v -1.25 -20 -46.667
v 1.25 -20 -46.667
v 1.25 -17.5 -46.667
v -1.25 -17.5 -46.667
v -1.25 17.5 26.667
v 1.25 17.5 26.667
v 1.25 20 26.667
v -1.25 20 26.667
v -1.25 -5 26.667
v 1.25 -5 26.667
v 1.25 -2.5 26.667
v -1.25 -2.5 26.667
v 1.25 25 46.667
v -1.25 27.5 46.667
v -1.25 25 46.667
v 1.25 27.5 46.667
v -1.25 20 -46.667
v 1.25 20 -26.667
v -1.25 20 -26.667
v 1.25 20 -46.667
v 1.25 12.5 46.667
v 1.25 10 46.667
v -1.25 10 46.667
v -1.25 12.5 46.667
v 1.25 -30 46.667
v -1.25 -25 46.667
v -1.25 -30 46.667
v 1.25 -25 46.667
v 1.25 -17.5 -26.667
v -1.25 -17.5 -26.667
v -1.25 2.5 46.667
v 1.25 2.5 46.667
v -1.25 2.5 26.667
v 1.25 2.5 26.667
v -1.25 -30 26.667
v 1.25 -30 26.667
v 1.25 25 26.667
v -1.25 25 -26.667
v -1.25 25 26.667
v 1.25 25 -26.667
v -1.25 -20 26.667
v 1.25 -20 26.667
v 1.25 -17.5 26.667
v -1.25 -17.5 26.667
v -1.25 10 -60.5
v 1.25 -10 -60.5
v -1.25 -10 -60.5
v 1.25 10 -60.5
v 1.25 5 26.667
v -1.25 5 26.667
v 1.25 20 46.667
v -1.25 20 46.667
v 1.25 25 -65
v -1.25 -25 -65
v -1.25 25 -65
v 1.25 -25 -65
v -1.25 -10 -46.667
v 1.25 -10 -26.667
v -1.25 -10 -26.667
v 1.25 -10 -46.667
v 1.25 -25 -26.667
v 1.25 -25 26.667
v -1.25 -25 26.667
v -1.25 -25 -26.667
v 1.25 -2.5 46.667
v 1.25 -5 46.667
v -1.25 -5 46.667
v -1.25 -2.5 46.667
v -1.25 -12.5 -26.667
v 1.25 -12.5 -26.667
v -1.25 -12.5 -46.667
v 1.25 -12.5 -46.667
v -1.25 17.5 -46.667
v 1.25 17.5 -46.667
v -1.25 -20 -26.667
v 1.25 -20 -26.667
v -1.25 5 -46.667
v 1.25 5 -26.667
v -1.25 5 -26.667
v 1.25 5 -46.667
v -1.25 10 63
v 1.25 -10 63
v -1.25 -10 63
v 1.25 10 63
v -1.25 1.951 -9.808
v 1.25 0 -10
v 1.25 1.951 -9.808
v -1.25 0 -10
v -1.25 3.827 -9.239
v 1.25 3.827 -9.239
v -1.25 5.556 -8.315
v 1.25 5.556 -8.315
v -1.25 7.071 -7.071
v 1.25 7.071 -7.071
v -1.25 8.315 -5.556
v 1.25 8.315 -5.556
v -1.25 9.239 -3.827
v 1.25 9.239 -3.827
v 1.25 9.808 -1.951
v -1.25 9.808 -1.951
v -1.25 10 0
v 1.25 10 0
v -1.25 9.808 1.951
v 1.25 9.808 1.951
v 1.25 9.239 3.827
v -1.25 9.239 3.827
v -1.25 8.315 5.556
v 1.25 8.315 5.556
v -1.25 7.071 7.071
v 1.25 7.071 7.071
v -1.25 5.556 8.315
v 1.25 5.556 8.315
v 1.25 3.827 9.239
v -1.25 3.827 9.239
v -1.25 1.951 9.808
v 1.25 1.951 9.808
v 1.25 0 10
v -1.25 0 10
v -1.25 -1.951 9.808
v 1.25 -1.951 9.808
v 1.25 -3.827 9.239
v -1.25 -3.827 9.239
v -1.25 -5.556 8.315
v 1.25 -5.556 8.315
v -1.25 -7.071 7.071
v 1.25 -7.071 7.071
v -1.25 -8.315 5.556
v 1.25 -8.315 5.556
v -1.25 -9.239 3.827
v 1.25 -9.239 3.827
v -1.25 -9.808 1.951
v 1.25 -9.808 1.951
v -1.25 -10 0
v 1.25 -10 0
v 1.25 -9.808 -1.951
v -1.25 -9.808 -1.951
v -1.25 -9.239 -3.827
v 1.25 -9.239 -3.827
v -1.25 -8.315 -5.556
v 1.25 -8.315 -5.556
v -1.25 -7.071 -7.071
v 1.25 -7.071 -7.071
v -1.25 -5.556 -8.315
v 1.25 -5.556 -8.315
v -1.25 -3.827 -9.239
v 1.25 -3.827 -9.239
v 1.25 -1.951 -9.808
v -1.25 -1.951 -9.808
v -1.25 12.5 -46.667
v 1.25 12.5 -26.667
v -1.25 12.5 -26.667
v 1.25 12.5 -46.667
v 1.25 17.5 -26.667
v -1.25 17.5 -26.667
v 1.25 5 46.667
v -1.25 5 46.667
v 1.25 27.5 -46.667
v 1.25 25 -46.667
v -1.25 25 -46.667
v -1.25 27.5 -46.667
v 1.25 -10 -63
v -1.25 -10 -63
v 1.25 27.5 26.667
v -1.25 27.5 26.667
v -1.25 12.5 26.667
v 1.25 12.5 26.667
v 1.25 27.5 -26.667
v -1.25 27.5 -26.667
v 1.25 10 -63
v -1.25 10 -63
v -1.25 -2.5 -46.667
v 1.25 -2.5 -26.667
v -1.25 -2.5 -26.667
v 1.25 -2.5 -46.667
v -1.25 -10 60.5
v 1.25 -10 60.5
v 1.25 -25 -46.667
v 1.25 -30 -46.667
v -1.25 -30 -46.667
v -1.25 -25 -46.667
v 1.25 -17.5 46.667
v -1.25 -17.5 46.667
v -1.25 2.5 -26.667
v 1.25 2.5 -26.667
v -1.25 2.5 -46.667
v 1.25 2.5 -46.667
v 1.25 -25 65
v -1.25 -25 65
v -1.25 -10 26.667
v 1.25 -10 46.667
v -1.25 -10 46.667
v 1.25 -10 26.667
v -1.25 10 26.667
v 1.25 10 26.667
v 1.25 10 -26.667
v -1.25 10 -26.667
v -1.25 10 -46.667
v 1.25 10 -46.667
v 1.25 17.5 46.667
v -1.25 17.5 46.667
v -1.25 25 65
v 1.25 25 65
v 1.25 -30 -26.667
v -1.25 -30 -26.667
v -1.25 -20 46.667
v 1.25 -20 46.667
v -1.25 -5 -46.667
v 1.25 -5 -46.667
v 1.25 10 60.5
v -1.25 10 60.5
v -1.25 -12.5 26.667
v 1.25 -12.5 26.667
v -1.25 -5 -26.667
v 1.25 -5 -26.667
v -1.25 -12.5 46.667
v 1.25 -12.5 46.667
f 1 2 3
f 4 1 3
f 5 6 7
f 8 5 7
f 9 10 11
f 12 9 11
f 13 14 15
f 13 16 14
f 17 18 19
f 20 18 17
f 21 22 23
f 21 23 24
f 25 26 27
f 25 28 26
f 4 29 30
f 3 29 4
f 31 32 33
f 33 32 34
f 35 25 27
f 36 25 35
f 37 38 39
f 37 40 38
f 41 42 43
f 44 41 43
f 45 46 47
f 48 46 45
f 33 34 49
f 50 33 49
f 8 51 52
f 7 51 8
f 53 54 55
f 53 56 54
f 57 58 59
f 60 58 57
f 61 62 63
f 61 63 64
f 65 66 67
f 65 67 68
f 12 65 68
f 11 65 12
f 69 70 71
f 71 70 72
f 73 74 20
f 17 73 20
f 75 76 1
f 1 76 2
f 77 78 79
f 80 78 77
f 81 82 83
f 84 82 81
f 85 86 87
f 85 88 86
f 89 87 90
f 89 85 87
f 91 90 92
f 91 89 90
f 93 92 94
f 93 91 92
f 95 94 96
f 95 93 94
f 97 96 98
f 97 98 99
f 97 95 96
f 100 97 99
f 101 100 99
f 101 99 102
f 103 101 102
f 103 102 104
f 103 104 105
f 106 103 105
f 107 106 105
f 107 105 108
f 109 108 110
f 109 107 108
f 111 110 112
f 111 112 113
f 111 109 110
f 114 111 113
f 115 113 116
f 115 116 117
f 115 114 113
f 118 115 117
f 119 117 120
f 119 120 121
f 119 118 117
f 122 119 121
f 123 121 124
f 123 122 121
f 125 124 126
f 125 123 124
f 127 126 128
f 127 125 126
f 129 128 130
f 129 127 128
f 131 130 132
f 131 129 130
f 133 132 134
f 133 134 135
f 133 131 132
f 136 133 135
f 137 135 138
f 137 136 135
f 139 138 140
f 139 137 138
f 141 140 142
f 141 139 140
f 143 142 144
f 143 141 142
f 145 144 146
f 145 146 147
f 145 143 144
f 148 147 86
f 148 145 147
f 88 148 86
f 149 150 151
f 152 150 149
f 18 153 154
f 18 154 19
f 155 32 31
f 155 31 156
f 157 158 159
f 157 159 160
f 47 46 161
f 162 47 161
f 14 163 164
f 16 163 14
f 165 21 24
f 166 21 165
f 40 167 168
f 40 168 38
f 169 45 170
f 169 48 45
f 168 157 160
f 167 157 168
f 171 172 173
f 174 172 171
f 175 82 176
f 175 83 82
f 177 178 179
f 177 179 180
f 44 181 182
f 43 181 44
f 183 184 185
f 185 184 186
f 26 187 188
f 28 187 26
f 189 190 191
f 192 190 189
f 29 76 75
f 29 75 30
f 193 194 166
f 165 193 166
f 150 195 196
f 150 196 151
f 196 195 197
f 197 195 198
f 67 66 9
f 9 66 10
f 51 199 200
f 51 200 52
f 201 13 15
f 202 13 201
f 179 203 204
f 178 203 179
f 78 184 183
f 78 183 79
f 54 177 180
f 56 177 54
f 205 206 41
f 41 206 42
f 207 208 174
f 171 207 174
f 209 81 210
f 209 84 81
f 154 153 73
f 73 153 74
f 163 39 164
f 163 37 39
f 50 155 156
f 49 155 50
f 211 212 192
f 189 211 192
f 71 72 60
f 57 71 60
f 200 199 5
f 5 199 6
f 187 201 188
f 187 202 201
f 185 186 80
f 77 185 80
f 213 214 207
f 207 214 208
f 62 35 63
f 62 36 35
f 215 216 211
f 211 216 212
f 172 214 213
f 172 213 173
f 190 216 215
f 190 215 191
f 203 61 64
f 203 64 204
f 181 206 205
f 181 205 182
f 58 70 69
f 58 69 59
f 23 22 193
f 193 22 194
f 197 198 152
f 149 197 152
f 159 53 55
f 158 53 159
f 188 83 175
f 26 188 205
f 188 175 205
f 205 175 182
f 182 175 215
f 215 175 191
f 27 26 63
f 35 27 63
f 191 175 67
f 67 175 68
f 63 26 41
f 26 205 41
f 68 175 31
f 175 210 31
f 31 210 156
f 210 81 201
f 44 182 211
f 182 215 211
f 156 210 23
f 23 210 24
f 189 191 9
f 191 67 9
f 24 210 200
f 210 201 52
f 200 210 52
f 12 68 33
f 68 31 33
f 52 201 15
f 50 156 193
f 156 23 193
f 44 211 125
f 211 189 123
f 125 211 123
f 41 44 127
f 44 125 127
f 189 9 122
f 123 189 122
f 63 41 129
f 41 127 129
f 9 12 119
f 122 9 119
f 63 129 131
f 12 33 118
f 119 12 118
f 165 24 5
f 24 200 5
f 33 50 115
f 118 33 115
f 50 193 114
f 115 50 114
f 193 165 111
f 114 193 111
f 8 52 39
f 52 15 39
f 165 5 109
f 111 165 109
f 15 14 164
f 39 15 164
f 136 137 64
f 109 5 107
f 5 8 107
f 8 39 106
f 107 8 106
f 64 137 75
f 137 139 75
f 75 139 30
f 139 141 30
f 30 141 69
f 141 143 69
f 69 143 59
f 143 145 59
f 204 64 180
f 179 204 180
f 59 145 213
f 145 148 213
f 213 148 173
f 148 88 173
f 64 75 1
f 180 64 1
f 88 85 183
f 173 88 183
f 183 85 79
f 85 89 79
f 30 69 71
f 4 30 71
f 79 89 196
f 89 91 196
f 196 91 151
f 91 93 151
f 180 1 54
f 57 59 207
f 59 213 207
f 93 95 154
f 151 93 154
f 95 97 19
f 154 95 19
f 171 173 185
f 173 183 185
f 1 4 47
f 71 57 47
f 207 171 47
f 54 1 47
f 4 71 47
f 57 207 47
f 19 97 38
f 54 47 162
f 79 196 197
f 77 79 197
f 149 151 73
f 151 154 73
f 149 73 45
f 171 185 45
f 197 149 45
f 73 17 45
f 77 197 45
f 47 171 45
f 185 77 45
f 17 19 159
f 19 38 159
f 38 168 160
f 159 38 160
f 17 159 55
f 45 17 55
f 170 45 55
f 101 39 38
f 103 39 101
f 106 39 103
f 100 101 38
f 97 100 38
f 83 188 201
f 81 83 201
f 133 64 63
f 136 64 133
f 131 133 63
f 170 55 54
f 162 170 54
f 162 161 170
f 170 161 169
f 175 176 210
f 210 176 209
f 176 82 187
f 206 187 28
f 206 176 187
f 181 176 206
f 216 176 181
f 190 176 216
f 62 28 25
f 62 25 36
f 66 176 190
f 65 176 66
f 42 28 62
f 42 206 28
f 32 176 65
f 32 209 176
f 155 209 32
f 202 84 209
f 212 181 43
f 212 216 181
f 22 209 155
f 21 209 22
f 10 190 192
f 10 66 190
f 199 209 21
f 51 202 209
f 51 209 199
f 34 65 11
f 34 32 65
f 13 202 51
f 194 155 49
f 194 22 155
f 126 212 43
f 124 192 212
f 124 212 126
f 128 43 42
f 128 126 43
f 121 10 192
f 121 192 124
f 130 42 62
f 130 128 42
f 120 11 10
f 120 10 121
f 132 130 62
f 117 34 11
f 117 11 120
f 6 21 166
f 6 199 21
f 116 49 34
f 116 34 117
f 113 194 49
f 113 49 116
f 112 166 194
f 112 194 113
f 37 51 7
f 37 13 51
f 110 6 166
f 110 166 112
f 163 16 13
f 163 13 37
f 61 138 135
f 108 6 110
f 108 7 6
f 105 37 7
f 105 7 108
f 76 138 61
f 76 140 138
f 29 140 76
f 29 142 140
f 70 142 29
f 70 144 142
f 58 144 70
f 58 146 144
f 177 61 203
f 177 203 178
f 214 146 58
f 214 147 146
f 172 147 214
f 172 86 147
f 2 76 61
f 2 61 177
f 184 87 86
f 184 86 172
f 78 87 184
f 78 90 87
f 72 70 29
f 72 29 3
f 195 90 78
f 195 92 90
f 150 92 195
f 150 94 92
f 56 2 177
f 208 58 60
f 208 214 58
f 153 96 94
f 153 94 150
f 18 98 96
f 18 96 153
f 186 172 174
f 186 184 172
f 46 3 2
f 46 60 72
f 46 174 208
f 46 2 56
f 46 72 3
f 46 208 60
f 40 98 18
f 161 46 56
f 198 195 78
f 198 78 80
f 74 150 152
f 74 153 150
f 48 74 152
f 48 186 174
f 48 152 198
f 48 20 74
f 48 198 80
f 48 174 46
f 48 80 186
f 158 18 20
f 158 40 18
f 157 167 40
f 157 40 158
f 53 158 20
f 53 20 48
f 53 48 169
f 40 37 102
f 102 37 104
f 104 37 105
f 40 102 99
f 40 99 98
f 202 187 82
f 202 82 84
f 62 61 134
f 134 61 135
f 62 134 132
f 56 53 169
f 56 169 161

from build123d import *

# Parameters (mm, degrees)
SKETCH1_4_R         = 10
SKETCH1_4_W         = 2.5
SKETCH1_4_H         = 20
BOSS_EXTRUDE3_DEPTH = 1.25
SKETCH2_W           = 20
SKETCH2_H           = 2.5
CUT_EXTRUDE1_DEPTH  = 72.632743909


with BuildPart() as part:
    # Sketch1<4> → Boss-Extrude3 (new, symmetric)
    with BuildSketch(Plane(origin=(0, 0, 0), x_dir=(0, 0, -1), z_dir=(1, 0, 0))):
        Polygon((-26.666666667, -30), (-26.666666667, -25), (26.666666667, -25), (26.666666667, -30), (46.666666667, -30), (46.666666667, -25), (65, -25), (65, 25), (46.666666667, 25), (46.666666667, 27.5), (26.666666667, 27.5), (26.666666667, 25), (-26.666666667, 25), (-26.666666667, 27.5), (-46.666666667, 27.5), (-46.666666667, 25), (-65, 25), (-65, -25), (-46.666666667, -25), (-46.666666667, -30), align=None)
        Circle(SKETCH1_4_R, mode=Mode.SUBTRACT)
        with Locations((-61.75, 0)):
            Rectangle(SKETCH1_4_W, SKETCH1_4_H, mode=Mode.SUBTRACT)
        with Locations((61.75, 0)):
            Rectangle(SKETCH1_4_W, SKETCH1_4_H, mode=Mode.SUBTRACT)
    extrude(amount=BOSS_EXTRUDE3_DEPTH, both=True)

    # Sketch2 → Cut-Extrude1 (cut, through all)
    with BuildSketch(Plane(origin=(1.25, 0, 0), x_dir=(0, 0, -1), z_dir=(1, 0, 0))):
        with Locations((-36.666666667, 18.75)):
            Rectangle(SKETCH2_W, SKETCH2_H)
        with Locations((-36.666666667, 11.25)):
            Rectangle(SKETCH2_W, SKETCH2_H)
        with Locations((-36.666666667, 3.75)):
            Rectangle(SKETCH2_W, SKETCH2_H)
        with Locations((-36.666666667, -3.75)):
            Rectangle(SKETCH2_W, SKETCH2_H)
        with Locations((-36.666666667, -11.25)):
            Rectangle(SKETCH2_W, SKETCH2_H)
        with Locations((-36.666666667, -18.75)):
            Rectangle(SKETCH2_W, SKETCH2_H)
        with Locations((36.666666667, -18.75)):
            Rectangle(SKETCH2_W, SKETCH2_H)
        with Locations((36.666666667, -11.25)):
            Rectangle(SKETCH2_W, SKETCH2_H)
        with Locations((36.666666667, -3.75)):
            Rectangle(SKETCH2_W, SKETCH2_H)
        with Locations((36.666666667, 3.75)):
            Rectangle(SKETCH2_W, SKETCH2_H)
        with Locations((36.666666667, 11.25)):
            Rectangle(SKETCH2_W, SKETCH2_H)
        with Locations((36.666666667, 18.75)):
            Rectangle(SKETCH2_W, SKETCH2_H)
    extrude(amount=-CUT_EXTRUDE1_DEPTH, mode=Mode.SUBTRACT)


solid = part.part
